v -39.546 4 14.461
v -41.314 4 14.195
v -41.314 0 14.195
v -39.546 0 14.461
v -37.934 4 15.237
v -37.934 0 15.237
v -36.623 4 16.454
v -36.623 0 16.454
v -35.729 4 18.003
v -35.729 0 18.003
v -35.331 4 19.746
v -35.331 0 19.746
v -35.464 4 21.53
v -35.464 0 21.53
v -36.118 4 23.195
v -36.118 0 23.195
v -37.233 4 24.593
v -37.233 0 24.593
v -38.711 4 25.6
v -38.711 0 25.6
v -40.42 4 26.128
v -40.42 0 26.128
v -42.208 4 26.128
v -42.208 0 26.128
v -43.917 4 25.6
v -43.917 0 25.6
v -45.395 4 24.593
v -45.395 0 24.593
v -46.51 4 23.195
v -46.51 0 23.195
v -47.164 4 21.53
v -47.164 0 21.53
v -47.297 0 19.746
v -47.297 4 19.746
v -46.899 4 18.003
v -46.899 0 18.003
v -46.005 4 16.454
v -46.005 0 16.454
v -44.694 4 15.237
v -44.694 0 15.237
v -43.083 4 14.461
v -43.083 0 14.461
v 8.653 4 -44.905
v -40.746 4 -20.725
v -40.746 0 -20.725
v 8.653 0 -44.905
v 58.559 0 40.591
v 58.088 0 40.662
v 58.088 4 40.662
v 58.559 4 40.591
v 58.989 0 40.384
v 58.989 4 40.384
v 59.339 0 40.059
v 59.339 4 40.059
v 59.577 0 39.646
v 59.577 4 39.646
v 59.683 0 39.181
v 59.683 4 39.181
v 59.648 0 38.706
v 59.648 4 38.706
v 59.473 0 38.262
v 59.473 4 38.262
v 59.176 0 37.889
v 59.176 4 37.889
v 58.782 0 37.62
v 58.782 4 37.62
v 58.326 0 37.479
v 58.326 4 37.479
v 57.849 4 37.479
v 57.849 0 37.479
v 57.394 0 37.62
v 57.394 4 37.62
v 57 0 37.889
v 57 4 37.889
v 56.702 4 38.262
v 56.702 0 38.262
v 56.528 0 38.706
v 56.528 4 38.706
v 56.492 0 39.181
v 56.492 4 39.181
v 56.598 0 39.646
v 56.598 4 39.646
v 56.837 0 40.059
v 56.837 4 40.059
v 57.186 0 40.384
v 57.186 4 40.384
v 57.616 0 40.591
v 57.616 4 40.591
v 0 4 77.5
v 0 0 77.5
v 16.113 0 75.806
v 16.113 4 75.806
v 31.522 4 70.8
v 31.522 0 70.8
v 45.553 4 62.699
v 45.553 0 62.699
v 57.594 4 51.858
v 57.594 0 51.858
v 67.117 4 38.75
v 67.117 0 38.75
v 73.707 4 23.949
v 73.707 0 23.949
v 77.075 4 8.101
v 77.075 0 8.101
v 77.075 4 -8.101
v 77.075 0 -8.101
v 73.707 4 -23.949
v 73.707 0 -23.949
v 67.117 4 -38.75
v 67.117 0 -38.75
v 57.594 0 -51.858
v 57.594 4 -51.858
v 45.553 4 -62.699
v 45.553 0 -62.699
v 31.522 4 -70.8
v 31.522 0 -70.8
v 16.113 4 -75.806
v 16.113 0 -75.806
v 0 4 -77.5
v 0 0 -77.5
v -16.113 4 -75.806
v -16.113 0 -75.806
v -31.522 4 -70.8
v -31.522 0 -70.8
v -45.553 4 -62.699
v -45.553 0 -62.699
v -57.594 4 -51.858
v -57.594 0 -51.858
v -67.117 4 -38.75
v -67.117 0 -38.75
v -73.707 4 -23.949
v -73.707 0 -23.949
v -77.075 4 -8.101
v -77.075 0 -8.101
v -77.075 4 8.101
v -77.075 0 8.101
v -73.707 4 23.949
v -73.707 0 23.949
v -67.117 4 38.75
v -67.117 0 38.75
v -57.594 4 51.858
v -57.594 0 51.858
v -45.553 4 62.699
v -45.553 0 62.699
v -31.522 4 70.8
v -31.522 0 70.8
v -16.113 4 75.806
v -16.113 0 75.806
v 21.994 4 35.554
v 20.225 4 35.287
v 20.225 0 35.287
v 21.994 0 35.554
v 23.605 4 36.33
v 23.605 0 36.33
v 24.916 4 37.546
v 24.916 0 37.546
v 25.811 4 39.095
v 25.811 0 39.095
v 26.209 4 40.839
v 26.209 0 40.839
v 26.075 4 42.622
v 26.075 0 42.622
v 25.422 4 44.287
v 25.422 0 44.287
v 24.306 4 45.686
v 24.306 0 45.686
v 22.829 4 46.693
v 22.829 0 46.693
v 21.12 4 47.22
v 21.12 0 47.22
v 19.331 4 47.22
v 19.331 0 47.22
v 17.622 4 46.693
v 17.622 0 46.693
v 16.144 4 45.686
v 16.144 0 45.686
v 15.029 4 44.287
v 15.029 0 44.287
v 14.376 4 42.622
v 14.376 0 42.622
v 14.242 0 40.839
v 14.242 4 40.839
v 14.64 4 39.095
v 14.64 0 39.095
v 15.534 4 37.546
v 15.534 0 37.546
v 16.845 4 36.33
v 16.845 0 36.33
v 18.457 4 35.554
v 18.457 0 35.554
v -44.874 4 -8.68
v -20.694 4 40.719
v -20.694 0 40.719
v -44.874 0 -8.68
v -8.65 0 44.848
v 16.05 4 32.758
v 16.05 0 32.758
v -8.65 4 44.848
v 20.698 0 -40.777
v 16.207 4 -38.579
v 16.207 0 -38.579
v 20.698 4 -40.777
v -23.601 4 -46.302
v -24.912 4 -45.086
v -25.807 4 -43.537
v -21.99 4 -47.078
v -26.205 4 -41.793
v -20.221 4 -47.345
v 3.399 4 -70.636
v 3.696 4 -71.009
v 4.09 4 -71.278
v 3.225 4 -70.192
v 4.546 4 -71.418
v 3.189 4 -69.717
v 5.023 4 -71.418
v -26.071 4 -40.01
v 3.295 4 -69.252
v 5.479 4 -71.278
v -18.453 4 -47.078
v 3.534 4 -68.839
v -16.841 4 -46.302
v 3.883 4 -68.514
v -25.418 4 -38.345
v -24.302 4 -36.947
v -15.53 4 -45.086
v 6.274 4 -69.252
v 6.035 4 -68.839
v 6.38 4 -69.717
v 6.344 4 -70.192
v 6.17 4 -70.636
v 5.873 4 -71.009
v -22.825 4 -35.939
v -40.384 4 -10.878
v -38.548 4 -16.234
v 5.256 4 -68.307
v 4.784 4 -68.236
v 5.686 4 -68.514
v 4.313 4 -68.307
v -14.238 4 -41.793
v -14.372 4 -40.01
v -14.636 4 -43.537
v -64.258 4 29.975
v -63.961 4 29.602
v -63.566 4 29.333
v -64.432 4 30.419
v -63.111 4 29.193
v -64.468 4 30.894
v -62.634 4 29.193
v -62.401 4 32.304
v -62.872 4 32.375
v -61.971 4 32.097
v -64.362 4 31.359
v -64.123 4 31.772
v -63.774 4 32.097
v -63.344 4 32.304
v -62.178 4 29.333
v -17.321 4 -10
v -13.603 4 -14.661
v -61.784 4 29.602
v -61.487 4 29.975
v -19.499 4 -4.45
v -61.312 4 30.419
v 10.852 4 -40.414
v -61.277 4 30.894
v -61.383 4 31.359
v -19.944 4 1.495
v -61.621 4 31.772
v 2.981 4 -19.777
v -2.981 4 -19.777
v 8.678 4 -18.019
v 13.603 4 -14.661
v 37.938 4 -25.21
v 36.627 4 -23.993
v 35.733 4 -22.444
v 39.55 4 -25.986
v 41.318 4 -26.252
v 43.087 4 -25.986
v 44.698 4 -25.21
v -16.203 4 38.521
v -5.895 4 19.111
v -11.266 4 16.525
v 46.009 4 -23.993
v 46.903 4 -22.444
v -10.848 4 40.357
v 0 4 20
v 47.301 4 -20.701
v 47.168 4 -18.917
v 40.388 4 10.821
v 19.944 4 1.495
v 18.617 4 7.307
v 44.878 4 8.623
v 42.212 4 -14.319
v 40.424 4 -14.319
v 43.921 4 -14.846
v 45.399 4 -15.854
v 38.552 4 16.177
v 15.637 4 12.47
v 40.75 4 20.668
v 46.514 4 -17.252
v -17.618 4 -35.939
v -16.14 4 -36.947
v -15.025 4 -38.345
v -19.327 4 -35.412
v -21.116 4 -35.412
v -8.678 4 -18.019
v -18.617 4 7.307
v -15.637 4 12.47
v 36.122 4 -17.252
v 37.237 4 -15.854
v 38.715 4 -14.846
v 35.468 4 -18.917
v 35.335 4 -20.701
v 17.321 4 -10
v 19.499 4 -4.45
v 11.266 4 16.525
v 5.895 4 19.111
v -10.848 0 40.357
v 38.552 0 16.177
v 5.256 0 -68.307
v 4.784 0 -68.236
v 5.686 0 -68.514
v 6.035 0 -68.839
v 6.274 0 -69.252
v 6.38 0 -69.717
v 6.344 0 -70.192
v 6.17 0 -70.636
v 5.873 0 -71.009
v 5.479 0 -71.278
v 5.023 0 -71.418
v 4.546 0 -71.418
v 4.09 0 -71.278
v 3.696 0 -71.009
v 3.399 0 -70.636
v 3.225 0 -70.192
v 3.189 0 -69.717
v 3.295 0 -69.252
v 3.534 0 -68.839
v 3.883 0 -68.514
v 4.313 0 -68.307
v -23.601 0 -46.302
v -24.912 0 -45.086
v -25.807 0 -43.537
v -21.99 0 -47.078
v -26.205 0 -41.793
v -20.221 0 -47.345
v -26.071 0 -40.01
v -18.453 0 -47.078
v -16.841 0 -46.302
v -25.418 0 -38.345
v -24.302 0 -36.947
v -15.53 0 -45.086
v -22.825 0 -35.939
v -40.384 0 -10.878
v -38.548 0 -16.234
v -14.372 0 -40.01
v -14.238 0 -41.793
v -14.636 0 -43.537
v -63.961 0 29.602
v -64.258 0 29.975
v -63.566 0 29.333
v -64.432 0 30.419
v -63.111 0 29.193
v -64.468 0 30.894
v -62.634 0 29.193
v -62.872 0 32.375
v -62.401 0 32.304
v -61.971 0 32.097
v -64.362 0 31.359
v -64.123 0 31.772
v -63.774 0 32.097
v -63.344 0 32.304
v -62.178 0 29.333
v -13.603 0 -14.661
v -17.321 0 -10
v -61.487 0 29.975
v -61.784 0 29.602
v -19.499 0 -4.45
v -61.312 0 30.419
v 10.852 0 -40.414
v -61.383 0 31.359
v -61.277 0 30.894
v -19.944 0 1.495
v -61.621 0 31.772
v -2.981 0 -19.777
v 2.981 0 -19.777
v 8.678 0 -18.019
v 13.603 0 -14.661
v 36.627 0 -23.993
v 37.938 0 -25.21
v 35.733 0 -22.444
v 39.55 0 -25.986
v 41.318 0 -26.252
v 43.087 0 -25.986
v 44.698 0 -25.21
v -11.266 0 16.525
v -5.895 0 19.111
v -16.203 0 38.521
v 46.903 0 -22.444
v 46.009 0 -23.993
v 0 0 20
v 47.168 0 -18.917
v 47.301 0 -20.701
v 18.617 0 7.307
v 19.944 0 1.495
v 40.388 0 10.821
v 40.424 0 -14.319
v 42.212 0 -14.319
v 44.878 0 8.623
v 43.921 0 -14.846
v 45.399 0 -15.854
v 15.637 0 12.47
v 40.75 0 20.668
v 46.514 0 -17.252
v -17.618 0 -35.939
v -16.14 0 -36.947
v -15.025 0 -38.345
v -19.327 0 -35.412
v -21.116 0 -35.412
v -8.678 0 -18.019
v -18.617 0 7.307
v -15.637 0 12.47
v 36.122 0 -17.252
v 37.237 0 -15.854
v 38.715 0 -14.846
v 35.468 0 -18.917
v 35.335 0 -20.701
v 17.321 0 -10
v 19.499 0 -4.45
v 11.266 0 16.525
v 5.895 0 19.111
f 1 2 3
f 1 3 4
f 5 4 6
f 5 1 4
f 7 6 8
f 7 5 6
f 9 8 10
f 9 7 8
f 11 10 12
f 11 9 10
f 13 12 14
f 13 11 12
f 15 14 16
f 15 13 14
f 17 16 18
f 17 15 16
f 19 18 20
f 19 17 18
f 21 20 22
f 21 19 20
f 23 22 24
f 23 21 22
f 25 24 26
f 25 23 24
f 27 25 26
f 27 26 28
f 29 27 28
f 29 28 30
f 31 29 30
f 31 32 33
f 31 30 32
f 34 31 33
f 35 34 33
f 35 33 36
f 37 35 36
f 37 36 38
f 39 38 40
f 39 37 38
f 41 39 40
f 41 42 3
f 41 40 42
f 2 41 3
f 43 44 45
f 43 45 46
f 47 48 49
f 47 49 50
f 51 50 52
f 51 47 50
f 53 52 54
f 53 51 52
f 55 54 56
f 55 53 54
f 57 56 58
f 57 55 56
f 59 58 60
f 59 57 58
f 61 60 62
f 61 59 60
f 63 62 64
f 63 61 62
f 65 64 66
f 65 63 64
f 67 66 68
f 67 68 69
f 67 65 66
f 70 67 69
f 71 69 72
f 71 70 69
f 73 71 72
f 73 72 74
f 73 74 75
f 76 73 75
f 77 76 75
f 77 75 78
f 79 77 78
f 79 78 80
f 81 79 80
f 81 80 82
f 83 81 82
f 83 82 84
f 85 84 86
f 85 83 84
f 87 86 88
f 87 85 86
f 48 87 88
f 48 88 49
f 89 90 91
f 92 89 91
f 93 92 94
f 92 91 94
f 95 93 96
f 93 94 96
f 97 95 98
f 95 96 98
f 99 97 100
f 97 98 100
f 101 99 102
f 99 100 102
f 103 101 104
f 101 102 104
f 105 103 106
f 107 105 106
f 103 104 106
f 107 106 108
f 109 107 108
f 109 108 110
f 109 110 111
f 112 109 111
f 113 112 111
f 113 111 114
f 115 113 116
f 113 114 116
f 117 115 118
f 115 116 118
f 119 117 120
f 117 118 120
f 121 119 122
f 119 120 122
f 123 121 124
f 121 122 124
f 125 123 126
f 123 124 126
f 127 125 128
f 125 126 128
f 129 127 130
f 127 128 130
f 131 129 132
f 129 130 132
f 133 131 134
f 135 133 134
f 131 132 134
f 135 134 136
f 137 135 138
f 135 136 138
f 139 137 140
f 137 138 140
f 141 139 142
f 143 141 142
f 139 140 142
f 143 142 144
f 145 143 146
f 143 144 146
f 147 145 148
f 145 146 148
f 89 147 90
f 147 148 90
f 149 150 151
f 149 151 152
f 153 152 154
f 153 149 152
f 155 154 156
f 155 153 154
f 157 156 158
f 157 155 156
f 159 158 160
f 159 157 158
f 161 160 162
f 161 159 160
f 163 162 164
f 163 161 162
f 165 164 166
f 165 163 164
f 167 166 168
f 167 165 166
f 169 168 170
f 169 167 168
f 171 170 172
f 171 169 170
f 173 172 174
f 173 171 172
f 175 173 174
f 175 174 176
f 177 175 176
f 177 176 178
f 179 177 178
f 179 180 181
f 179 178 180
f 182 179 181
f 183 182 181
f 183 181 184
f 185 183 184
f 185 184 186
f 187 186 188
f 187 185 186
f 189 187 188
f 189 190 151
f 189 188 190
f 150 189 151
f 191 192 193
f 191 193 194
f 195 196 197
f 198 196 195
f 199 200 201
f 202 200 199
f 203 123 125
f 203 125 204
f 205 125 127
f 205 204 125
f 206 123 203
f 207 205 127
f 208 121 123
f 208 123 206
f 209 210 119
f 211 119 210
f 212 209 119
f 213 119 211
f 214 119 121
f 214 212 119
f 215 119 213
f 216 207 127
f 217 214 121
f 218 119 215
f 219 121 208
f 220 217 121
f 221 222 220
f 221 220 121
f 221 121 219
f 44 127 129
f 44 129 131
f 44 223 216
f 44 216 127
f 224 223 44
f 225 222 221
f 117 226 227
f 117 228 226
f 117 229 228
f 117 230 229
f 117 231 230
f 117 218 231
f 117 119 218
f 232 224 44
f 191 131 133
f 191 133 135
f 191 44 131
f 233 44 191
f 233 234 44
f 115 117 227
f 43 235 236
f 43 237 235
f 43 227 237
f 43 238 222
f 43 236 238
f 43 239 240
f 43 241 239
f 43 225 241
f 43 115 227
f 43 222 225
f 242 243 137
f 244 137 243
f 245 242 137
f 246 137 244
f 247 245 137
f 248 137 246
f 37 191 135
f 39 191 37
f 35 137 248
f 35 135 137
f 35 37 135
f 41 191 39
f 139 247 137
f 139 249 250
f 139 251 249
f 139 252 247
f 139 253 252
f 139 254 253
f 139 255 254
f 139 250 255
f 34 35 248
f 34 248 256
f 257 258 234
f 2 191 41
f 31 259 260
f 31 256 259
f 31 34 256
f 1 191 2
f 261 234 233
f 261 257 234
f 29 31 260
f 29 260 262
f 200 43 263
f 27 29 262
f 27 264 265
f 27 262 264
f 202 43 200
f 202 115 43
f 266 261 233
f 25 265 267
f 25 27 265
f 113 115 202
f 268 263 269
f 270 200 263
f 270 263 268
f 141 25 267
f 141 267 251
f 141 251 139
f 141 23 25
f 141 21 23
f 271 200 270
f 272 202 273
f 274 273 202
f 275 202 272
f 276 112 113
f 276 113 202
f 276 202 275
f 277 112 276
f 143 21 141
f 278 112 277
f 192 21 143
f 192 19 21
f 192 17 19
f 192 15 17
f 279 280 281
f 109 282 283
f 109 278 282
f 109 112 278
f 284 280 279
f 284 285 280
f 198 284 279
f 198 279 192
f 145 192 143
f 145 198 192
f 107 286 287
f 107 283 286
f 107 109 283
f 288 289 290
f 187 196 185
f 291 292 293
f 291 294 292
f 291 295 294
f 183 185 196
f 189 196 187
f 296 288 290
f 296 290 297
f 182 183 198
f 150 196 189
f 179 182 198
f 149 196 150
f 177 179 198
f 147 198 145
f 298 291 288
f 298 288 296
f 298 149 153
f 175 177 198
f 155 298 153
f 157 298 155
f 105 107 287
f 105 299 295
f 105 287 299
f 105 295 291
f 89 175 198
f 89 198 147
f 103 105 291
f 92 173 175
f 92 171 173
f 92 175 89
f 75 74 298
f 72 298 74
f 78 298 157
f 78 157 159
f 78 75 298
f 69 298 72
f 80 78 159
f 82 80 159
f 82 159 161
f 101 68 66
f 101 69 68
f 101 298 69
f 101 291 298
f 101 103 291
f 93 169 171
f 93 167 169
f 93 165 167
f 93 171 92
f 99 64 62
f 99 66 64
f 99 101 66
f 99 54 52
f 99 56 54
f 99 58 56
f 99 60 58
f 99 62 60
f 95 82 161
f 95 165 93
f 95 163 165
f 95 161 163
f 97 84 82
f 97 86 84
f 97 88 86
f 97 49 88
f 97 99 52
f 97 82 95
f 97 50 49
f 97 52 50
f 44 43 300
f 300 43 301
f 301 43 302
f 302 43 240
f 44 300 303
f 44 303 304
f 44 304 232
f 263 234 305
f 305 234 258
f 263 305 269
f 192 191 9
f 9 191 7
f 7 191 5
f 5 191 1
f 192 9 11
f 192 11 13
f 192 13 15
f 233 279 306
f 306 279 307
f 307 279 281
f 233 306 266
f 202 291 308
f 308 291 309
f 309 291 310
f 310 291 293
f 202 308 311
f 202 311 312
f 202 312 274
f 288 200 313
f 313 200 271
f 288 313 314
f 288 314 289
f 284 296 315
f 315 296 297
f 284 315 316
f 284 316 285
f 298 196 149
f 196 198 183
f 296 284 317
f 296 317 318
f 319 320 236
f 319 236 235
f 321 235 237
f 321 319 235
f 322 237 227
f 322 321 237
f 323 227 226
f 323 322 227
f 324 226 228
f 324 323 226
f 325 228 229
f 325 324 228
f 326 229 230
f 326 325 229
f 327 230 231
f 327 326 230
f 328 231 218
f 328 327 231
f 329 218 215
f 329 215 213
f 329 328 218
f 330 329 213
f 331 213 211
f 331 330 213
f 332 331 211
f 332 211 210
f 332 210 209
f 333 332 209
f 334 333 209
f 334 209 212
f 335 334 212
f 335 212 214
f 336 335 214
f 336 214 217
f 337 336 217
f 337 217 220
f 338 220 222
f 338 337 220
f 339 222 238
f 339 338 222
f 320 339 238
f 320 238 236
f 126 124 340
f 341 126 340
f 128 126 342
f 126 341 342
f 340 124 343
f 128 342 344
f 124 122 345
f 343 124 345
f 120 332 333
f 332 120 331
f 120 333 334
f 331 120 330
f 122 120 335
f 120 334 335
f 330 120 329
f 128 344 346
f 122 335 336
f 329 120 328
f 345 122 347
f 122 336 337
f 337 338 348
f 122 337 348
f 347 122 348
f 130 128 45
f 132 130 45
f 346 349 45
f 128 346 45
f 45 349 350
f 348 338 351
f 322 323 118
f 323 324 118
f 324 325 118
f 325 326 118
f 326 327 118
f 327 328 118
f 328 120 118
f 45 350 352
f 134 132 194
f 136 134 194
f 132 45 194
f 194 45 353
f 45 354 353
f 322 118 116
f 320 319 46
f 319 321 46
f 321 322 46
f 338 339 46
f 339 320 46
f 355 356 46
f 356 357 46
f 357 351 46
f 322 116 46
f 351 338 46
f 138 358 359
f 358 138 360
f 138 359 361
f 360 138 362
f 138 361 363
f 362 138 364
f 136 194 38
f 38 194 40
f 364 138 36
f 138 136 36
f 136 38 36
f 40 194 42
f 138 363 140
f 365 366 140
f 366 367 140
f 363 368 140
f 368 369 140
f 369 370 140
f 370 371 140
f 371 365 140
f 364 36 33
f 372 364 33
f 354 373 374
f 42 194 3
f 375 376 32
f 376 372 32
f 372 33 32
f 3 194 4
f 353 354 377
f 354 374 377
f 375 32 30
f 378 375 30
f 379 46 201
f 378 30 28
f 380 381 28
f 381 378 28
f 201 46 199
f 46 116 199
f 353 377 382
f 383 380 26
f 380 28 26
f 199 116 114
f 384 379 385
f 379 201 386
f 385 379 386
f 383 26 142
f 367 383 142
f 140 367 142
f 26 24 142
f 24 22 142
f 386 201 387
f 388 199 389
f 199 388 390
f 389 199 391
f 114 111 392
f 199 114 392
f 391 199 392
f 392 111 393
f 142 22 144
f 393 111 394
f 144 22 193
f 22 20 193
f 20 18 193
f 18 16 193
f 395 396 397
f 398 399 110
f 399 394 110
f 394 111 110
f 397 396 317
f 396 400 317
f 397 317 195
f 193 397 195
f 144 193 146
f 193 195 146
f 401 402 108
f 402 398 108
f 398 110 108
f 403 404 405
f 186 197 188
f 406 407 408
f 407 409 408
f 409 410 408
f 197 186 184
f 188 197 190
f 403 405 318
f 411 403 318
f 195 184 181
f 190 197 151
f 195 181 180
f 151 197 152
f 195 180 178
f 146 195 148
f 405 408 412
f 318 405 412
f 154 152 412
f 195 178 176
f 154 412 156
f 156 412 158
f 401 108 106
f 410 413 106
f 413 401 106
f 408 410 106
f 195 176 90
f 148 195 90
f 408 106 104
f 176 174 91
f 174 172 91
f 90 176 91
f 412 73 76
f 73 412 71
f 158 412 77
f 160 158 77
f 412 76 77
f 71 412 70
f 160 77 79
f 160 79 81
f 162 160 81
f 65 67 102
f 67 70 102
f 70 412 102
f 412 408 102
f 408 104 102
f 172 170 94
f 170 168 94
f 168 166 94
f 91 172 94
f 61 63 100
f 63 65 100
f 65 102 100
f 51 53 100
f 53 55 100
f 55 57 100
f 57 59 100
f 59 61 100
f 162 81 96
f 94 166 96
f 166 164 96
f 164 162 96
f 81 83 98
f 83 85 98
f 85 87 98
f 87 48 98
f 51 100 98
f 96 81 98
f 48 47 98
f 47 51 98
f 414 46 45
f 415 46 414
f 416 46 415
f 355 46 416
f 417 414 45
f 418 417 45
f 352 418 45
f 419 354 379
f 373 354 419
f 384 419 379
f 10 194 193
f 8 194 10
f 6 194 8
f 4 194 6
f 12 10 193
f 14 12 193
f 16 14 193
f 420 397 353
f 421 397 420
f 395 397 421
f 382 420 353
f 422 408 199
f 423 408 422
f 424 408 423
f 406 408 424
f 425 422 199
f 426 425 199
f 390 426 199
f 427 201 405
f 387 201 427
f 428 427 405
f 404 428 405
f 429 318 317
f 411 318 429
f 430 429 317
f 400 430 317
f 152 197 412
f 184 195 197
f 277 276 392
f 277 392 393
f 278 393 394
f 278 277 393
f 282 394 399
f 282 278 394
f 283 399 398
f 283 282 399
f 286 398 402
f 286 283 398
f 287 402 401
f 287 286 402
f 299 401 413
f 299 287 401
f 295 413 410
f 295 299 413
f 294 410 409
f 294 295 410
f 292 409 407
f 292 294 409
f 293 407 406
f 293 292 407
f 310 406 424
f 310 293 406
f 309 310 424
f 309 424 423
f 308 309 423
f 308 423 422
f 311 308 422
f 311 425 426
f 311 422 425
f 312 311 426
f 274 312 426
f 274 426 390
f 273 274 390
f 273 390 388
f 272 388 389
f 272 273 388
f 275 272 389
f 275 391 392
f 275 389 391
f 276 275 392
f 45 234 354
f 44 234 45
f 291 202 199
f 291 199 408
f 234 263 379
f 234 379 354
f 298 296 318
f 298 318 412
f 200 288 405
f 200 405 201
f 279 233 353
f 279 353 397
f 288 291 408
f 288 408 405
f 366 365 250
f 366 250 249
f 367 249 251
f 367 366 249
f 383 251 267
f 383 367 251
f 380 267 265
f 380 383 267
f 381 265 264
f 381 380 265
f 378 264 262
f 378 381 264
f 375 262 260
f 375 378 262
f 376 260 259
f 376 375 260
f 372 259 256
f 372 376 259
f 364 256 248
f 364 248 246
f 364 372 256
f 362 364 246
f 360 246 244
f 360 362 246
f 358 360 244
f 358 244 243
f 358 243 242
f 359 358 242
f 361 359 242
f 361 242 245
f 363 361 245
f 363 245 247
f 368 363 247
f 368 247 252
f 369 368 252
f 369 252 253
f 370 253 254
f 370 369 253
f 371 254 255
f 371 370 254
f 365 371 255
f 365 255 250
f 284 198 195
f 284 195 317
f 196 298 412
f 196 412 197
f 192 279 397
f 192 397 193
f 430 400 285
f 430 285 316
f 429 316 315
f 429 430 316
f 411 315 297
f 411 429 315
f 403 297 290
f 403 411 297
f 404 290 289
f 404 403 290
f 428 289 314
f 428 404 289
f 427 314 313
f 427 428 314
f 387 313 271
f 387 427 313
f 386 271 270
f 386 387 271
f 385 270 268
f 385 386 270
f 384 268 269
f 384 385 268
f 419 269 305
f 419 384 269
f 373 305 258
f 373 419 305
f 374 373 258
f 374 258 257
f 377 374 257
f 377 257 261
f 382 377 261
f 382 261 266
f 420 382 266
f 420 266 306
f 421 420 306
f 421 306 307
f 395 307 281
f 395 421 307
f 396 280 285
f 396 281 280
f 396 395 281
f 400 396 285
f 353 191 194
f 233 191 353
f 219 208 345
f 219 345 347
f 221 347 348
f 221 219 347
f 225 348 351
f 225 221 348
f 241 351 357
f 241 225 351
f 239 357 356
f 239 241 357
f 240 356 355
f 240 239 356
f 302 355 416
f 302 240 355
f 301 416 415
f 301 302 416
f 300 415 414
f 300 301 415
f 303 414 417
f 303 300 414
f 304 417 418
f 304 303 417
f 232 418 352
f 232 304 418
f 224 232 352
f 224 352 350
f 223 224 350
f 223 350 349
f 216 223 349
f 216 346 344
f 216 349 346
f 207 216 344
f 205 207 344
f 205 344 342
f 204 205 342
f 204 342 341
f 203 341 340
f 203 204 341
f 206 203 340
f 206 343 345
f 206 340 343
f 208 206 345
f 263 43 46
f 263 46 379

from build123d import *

# Parameters (mm, degrees)
SKETCH_1_R               = 77.5
SKETCH_1_R_2             = 1.6
EXTRUDE_1_DEPTH          = 4
CUT_EXTRUDE_2_DEPTH      = 110.674518463
CUT_EXTRUDE_2_DEPTH_BACK = 110.674518463
SKETCH_3_R               = 20
CUT_EXTRUDE_3_DEPTH      = 110.674518463
CUT_EXTRUDE_3_DEPTH_BACK = 110.674518463
SKETCH_4_R               = 6


with BuildPart() as part:
    # 草图1 → 凸台-拉伸1 (new body)
    with BuildSketch(Plane(origin=(0, 0, 0), x_dir=(1, 0, 0), z_dir=(0, 1, 0))):
        with Locations(Location((0, 0, 0), (0, 0, 270))):
            Circle(SKETCH_1_R)
        with Locations(Location((4.784441198, 69.836302325, 0), (0, 0, 270))):
            Circle(SKETCH_1_R_2, mode=Mode.SUBTRACT)
        with Locations(Location((-62.872232519, -30.774703542, 0), (0, 0, 270))):
            Circle(SKETCH_1_R_2, mode=Mode.SUBTRACT)
        with Locations(Location((58.087791321, -39.061598783, 0), (0, 0, 270))):
            Circle(SKETCH_1_R_2, mode=Mode.SUBTRACT)
    extrude(amount=EXTRUDE_1_DEPTH)

    # 草图3 → 切除-拉伸2 (cut, two sides: drawn at the far end of the back side and taken through both)
    with BuildSketch(Plane(origin=(0, 4, 0), x_dir=(1, 0, 0), z_dir=(0, 1, 0)).offset(-CUT_EXTRUDE_2_DEPTH_BACK)):
        with Locations(Location((0, 0, 0), (0, 0, 270))):
            Circle(SKETCH_3_R)
    extrude(amount=CUT_EXTRUDE_2_DEPTH + CUT_EXTRUDE_2_DEPTH_BACK, mode=Mode.SUBTRACT)

    # 草图4 → 切除-拉伸3 (cut, two sides: drawn at the far end of the back side and taken through both)
    with BuildSketch(Plane.XZ.offset(-CUT_EXTRUDE_3_DEPTH_BACK)):
        with Locations(Location((-41.314039797, 20.194571008, 0), (0, 0, 270))):
            Circle(SKETCH_4_R)
        Polygon((-20.69437357, 40.719305585), (-44.874497782, -8.680305679), (-40.383624031, -10.87849879), (-16.203499819, 38.521112475), align=None)
        Polygon((-10.847694468, 40.35681714), (13.852111164, 28.266755034), (16.050304274, 32.757628786), (-8.649501358, 44.847690892), align=None)
        with Locations(Location((20.225375329, 41.287232906, 0), (0, 0, 270))):
            Circle(SKETCH_4_R)
        Polygon((13.852111164, 28.266755034), (38.551916796, 16.176692928), (40.750109907, 20.66756668), (16.050304274, 32.757628786), align=None)
        Polygon((20.698371001, -40.776916797), (44.878495213, 8.622694468), (40.387621462, 10.820887578), (16.20749725, -38.578723687), align=None)
        with Locations(Location((41.318037228, -20.252182219, 0), (0, 0, 270))):
            Circle(SKETCH_4_R)
        Polygon((-40.746112475, -20.725177891), (8.653498789, -44.905302103), (10.851691899, -40.414428352), (-38.547919365, -16.23430414), align=None)
        with Locations(Location((-20.221377898, -41.344844118, 0), (0, 0, 270))):
            Circle(SKETCH_4_R)
    extrude(amount=CUT_EXTRUDE_3_DEPTH + CUT_EXTRUDE_3_DEPTH_BACK, mode=Mode.SUBTRACT)


solid = part.part
